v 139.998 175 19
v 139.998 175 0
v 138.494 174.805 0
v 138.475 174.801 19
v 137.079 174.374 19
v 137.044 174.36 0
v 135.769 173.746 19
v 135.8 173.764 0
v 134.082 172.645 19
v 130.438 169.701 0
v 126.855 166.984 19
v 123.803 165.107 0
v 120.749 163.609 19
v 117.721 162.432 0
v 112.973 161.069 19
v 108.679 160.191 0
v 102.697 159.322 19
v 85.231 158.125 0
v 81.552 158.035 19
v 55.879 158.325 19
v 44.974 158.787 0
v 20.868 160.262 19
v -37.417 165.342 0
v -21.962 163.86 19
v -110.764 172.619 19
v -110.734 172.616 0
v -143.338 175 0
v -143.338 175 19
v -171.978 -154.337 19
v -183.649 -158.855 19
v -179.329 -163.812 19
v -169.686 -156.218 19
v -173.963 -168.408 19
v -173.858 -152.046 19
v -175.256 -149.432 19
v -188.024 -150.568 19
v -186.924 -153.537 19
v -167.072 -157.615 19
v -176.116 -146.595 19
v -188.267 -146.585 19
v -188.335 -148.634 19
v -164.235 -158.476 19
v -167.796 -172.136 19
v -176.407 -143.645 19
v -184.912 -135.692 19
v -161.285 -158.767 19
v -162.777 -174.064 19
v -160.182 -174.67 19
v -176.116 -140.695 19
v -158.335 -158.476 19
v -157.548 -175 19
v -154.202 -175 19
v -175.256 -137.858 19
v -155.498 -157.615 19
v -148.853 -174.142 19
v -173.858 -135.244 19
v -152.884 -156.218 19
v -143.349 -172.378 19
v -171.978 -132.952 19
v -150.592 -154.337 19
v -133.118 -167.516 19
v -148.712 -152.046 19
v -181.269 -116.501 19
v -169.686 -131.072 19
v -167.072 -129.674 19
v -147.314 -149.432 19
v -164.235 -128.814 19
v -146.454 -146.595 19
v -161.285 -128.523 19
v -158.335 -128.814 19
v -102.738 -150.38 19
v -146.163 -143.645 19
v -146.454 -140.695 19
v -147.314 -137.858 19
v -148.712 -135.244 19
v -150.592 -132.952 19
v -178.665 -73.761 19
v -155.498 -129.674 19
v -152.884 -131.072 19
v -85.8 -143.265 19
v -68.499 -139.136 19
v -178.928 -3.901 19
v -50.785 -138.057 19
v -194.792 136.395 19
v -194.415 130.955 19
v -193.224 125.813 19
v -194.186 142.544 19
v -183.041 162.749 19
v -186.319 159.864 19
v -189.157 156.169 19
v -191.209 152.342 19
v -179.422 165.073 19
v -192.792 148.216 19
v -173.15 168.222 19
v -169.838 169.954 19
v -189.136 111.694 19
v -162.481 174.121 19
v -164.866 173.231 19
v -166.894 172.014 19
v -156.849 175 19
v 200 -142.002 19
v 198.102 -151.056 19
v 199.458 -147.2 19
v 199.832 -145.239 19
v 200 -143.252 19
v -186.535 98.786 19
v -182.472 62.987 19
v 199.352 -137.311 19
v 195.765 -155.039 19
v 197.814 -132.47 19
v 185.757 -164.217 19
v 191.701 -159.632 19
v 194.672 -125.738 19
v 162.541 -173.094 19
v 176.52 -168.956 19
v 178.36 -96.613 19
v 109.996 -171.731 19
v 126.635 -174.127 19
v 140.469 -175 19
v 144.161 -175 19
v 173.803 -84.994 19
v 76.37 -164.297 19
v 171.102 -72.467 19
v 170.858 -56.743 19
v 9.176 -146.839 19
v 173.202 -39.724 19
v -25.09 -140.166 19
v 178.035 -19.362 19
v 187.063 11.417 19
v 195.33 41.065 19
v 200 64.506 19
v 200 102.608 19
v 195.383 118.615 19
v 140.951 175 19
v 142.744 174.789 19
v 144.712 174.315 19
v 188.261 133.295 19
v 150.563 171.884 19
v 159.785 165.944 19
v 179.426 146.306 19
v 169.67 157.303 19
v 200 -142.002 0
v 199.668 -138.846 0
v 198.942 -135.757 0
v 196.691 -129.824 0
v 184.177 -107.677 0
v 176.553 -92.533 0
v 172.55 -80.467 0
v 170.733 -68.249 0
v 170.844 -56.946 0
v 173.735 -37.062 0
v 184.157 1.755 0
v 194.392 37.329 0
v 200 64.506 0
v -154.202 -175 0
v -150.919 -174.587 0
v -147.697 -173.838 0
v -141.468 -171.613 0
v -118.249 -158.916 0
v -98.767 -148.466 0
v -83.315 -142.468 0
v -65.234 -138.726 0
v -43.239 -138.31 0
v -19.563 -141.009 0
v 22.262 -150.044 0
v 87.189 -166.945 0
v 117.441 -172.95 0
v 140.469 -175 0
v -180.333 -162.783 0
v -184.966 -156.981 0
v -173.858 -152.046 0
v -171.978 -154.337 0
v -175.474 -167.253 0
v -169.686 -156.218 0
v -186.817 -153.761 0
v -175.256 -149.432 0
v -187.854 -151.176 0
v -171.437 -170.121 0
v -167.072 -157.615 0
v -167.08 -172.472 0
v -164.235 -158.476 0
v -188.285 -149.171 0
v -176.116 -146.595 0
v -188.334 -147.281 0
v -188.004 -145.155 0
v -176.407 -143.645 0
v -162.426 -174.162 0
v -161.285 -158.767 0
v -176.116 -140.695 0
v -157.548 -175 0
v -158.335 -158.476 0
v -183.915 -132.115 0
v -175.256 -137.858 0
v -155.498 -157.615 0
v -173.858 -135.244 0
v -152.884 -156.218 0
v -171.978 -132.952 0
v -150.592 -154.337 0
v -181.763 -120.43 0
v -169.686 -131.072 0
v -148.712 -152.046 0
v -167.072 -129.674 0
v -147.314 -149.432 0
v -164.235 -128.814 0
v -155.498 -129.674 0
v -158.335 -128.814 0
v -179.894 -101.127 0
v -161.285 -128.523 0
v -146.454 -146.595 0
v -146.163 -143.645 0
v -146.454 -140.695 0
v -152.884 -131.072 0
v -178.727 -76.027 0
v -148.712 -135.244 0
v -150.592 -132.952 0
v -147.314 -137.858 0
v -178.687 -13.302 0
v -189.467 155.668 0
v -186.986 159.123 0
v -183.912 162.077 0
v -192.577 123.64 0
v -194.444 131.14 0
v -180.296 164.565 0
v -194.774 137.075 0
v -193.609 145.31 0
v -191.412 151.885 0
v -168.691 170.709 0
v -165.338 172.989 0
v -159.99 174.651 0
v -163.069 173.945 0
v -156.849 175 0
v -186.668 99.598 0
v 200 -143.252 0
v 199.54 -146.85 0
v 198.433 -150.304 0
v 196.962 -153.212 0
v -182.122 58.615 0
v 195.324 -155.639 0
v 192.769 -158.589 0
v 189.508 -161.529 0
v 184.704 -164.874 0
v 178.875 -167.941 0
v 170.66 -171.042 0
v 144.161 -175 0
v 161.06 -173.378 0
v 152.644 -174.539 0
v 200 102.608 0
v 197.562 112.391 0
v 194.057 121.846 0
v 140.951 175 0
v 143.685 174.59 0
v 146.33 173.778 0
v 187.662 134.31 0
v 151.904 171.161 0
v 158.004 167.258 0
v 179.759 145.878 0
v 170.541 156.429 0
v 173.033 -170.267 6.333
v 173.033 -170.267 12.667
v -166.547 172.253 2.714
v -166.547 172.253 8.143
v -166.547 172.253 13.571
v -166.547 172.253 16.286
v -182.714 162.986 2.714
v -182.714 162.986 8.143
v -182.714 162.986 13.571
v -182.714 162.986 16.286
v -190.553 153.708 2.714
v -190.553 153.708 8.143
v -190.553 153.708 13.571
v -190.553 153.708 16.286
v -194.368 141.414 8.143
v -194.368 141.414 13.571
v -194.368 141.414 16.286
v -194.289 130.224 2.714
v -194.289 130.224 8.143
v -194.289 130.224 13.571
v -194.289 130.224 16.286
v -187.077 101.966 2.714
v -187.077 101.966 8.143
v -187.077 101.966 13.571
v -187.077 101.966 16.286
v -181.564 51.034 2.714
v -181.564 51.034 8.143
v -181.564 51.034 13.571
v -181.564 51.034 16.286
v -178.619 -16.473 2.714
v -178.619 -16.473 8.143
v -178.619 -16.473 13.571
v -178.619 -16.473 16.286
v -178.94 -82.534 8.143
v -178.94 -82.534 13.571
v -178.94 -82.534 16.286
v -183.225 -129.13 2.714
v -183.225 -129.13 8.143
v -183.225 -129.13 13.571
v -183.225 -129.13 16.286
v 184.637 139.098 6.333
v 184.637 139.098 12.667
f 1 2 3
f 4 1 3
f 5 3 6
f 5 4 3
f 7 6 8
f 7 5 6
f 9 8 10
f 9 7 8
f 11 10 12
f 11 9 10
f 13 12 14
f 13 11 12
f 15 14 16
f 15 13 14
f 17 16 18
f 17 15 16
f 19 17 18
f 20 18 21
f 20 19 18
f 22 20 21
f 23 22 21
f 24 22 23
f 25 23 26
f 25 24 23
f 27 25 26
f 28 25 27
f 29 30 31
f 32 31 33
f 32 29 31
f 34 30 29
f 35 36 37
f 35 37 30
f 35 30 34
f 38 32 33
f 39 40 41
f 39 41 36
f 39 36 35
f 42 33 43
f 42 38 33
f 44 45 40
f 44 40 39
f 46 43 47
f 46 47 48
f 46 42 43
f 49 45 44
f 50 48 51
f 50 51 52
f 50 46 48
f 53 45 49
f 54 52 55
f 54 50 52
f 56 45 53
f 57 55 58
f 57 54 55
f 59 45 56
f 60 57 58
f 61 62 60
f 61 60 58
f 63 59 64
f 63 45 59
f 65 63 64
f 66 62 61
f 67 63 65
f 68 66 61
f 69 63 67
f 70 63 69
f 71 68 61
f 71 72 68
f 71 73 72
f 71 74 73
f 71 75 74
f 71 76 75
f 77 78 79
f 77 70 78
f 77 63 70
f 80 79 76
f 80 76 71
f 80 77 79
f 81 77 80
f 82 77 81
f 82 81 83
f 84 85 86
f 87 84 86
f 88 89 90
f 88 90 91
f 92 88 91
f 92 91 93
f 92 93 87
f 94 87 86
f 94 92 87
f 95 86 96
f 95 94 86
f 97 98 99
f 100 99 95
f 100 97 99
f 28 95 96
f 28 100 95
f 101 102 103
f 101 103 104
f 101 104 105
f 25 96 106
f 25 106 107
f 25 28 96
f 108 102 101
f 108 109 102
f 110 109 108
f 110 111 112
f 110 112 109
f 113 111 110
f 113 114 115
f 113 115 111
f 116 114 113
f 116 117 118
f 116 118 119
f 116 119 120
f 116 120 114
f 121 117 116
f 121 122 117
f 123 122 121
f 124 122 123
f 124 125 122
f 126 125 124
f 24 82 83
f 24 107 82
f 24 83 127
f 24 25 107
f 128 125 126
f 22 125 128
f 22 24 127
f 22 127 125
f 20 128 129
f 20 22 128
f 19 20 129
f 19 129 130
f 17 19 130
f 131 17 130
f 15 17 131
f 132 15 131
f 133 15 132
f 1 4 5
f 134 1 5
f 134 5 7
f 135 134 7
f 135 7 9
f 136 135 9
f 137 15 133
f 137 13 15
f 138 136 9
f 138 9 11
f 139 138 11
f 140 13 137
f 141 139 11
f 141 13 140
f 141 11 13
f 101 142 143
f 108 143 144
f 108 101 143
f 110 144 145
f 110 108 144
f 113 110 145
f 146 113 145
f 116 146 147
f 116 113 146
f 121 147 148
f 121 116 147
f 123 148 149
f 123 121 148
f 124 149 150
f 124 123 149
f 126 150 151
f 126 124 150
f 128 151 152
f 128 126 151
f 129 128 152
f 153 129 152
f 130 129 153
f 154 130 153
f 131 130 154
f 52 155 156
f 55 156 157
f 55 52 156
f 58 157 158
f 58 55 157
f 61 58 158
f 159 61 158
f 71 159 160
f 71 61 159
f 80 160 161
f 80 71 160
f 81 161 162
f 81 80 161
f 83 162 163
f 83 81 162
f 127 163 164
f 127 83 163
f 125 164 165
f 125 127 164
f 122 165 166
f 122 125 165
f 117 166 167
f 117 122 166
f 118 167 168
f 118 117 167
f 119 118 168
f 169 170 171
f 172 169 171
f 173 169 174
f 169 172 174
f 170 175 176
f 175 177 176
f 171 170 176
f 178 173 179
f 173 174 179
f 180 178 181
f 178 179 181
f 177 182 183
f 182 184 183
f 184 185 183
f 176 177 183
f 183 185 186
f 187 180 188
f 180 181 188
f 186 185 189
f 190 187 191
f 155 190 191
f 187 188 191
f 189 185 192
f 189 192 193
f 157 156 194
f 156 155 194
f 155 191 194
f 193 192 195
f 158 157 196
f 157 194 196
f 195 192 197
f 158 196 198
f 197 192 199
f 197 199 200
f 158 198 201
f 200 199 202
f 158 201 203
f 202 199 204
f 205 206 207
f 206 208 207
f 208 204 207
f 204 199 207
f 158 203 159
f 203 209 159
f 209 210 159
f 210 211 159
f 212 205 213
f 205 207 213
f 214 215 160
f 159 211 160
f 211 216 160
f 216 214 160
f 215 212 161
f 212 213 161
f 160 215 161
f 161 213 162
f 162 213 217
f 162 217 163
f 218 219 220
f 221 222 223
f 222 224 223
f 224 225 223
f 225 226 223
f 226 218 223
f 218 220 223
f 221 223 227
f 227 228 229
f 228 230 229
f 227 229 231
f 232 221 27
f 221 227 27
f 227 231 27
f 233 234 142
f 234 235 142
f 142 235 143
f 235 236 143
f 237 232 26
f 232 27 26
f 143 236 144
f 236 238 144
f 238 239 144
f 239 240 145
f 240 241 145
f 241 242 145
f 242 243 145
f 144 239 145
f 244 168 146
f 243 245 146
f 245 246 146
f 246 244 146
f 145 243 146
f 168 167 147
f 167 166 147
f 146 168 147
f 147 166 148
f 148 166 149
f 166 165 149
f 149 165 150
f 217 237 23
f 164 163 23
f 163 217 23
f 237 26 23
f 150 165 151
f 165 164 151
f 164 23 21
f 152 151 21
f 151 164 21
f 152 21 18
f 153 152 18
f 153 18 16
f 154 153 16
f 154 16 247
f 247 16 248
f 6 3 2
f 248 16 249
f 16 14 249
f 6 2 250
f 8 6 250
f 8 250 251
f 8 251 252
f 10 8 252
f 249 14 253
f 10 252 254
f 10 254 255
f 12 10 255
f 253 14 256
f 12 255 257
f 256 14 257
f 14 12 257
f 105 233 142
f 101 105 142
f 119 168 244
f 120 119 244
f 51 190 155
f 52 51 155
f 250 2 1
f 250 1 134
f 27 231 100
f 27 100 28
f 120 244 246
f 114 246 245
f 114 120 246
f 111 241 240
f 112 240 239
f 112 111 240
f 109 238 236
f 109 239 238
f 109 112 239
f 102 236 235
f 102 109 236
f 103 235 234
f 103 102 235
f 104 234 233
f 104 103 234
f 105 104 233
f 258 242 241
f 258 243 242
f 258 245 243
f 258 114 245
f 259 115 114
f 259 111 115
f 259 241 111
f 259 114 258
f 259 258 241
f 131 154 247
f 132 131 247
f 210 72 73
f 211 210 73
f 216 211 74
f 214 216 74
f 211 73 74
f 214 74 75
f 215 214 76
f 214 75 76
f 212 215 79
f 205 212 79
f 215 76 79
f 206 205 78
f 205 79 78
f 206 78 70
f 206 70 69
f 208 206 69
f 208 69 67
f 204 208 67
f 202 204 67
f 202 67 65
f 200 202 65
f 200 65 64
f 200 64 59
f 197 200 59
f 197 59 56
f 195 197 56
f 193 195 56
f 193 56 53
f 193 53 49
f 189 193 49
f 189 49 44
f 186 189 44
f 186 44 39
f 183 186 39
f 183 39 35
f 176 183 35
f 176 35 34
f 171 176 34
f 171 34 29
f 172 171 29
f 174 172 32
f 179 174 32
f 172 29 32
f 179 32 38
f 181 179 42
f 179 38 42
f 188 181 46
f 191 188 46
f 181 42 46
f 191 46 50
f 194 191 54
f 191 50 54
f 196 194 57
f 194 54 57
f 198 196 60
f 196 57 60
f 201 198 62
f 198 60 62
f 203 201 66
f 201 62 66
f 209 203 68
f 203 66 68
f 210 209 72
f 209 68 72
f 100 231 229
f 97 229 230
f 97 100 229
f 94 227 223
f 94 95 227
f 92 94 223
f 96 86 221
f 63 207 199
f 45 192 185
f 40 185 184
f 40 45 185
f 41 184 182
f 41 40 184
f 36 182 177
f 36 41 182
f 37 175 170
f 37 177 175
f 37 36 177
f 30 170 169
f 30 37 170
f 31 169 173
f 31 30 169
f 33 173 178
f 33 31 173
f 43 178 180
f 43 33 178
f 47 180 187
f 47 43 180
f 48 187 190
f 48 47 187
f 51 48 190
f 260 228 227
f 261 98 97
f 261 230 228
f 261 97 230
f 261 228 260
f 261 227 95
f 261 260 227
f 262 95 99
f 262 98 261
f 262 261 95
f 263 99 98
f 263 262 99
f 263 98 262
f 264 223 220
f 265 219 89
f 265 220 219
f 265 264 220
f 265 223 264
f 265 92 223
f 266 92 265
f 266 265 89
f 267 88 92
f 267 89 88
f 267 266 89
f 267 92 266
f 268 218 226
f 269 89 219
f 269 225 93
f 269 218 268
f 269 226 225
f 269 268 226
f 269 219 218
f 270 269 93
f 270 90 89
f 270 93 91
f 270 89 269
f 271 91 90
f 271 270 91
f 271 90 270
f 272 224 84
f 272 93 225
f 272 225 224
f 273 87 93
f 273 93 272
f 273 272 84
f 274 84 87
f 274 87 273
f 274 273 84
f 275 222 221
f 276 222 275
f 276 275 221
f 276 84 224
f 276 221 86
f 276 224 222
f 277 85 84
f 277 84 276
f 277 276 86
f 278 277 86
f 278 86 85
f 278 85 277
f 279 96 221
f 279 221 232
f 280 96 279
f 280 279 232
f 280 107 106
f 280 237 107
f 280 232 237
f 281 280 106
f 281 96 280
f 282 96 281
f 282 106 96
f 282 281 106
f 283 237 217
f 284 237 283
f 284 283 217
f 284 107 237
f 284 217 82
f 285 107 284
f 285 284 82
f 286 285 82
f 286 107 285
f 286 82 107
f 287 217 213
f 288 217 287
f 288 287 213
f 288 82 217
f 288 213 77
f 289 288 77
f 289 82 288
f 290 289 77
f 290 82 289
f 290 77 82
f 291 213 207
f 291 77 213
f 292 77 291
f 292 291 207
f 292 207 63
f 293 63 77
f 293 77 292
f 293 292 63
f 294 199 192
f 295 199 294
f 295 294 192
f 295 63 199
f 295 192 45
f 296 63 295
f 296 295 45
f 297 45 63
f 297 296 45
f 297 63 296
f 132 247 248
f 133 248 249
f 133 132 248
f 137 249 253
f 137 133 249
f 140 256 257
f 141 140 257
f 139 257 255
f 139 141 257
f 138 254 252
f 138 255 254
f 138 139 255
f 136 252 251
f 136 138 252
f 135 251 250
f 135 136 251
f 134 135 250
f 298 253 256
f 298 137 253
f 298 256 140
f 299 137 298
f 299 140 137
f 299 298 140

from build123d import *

# Parameters (mm, degrees)
F0_W     = 400
F0_H     = 350
F1_DEPTH = 19
F3_DEPTH = 19.001
F2_R     = 15.1217172487
F4_DEPTH = 19.0010001


with BuildPart() as f1:
    # F0 (on Top) → F1 (new body)
    with BuildSketch(Plane.XY):
        Rectangle(F0_W, F0_H)
    extrude(amount=F1_DEPTH)

    # F2 (on face) → F3 (cut, through all)
    with BuildSketch(Plane.XY.offset(19)):
        with BuildLine():
            Line((139.9984191032, 175), (-143.3382051032, 175))
            add(Edge.make_bspline(
                [(139.9984191032, 175), (132.5654700253, 174.6496124521), (124.8887627653, 140.884546191), (-86.9785932309, 172.7045538974), (-143.3382051032, 175)],
                knots=[0.8349867466, 0.8349867466, 0.8349867466, 0.8349867466, 0.8743157542, 0.9887199032, 0.9887199032, 0.9887199032, 0.9887199032], degree=3))
        make_face()
        with BuildLine():
            Line((200, 175), (140.9513056278, 175))
            add(Edge.make_bspline(
                [(200, 102.6081219316), (192.4685199101, 142.8159812544), (155.7686945176, 174.3308605765), (140.9513056278, 175)],
                knots=[0.7597614207, 0.7597614207, 0.7597614207, 0.7597614207, 0.8333581006, 0.8333581006, 0.8333581006, 0.8333581006], degree=3))
            Line((200, 102.6081219315), (200, 175))
        make_face()
        with BuildLine():
            Line((200, -142.0017472128), (200, 64.5061459425))
            add(Edge.make_bspline(
                [(200, -142.0017472128), (199.4329105241, -124.0235355686), (144.7983687215, -77.937710136), (193.1859977178, 17.0033735573), (200, 64.5061459425)],
                knots=[0.593288087, 0.593288087, 0.593288087, 0.593288087, 0.6582831814, 0.7376899258, 0.7376899258, 0.7376899258, 0.7376899258], degree=3))
        make_face()
        with BuildLine():
            add(Edge.make_bspline(
                [(144.1609859467, -175), (176.8193483932, -174.4875053292), (199.4599303841, -160.0155497317), (200, -143.2522982359)],
                knots=[0.5307493681, 0.5307493681, 0.5307493681, 0.5307493681, 0.59177578, 0.59177578, 0.59177578, 0.59177578], degree=3))
            Line((144.1609859467, -175), (200, -175))
            Line((200, -175), (200, -143.2522982359))
        make_face()
        with BuildLine():
            add(Edge.make_bspline(
                [(-154.202432909, -175), (-132.6486954492, -173.5684929992), (-69.5067362952, -101.5811396609), (80.2937212178, -174.0902233299), (140.4689487721, -175)],
                knots=[0.3482193392, 0.3482193392, 0.3482193392, 0.3482193392, 0.4184935934, 0.5284753271, 0.5284753271, 0.5284753271, 0.5284753271], degree=3))
            Line((-154.202432909, -175), (140.4689487721, -175))
        make_face()
        with BuildLine():
            add(Edge.make_bspline(
                [(-156.8490415812, 175), (-165.3374317263, 174.3856228152), (-167.5028899481, 169.4072833112), (-190.0466375071, 162.6257906862), (-198.0782826841, 130.4278651247), (-179.7620941005, 106.9409813337), (-173.3717158261, -132.4156144029), (-195.0294793917, -149.0567252475), (-171.7834887438, -174.0121083658), (-157.5476378202, -175)],
                knots=[0, 0, 0, 0, 0.0283137694, 0.0620220617, 0.1011380618, 0.1452969745, 0.2610584813, 0.2975065975, 0.3445581979, 0.3445581979, 0.3445581979, 0.3445581979], degree=3))
            Line((-156.8490415812, 175), (-200, 175))
            Line((-200, 175), (-200, -175))
            Line((-200, -175), (-157.5476378202, -175))
        make_face()
    extrude(amount=-F3_DEPTH, mode=Mode.SUBTRACT)

    # F2 (on face) → F4 (cut, through all)
    with BuildSketch(Plane.XY.offset(19)):
        with Locations((-161.2850278616, -143.6447948217)):
            Circle(F2_R)
    extrude(amount=-F4_DEPTH, mode=Mode.SUBTRACT)


solid = f1.part
